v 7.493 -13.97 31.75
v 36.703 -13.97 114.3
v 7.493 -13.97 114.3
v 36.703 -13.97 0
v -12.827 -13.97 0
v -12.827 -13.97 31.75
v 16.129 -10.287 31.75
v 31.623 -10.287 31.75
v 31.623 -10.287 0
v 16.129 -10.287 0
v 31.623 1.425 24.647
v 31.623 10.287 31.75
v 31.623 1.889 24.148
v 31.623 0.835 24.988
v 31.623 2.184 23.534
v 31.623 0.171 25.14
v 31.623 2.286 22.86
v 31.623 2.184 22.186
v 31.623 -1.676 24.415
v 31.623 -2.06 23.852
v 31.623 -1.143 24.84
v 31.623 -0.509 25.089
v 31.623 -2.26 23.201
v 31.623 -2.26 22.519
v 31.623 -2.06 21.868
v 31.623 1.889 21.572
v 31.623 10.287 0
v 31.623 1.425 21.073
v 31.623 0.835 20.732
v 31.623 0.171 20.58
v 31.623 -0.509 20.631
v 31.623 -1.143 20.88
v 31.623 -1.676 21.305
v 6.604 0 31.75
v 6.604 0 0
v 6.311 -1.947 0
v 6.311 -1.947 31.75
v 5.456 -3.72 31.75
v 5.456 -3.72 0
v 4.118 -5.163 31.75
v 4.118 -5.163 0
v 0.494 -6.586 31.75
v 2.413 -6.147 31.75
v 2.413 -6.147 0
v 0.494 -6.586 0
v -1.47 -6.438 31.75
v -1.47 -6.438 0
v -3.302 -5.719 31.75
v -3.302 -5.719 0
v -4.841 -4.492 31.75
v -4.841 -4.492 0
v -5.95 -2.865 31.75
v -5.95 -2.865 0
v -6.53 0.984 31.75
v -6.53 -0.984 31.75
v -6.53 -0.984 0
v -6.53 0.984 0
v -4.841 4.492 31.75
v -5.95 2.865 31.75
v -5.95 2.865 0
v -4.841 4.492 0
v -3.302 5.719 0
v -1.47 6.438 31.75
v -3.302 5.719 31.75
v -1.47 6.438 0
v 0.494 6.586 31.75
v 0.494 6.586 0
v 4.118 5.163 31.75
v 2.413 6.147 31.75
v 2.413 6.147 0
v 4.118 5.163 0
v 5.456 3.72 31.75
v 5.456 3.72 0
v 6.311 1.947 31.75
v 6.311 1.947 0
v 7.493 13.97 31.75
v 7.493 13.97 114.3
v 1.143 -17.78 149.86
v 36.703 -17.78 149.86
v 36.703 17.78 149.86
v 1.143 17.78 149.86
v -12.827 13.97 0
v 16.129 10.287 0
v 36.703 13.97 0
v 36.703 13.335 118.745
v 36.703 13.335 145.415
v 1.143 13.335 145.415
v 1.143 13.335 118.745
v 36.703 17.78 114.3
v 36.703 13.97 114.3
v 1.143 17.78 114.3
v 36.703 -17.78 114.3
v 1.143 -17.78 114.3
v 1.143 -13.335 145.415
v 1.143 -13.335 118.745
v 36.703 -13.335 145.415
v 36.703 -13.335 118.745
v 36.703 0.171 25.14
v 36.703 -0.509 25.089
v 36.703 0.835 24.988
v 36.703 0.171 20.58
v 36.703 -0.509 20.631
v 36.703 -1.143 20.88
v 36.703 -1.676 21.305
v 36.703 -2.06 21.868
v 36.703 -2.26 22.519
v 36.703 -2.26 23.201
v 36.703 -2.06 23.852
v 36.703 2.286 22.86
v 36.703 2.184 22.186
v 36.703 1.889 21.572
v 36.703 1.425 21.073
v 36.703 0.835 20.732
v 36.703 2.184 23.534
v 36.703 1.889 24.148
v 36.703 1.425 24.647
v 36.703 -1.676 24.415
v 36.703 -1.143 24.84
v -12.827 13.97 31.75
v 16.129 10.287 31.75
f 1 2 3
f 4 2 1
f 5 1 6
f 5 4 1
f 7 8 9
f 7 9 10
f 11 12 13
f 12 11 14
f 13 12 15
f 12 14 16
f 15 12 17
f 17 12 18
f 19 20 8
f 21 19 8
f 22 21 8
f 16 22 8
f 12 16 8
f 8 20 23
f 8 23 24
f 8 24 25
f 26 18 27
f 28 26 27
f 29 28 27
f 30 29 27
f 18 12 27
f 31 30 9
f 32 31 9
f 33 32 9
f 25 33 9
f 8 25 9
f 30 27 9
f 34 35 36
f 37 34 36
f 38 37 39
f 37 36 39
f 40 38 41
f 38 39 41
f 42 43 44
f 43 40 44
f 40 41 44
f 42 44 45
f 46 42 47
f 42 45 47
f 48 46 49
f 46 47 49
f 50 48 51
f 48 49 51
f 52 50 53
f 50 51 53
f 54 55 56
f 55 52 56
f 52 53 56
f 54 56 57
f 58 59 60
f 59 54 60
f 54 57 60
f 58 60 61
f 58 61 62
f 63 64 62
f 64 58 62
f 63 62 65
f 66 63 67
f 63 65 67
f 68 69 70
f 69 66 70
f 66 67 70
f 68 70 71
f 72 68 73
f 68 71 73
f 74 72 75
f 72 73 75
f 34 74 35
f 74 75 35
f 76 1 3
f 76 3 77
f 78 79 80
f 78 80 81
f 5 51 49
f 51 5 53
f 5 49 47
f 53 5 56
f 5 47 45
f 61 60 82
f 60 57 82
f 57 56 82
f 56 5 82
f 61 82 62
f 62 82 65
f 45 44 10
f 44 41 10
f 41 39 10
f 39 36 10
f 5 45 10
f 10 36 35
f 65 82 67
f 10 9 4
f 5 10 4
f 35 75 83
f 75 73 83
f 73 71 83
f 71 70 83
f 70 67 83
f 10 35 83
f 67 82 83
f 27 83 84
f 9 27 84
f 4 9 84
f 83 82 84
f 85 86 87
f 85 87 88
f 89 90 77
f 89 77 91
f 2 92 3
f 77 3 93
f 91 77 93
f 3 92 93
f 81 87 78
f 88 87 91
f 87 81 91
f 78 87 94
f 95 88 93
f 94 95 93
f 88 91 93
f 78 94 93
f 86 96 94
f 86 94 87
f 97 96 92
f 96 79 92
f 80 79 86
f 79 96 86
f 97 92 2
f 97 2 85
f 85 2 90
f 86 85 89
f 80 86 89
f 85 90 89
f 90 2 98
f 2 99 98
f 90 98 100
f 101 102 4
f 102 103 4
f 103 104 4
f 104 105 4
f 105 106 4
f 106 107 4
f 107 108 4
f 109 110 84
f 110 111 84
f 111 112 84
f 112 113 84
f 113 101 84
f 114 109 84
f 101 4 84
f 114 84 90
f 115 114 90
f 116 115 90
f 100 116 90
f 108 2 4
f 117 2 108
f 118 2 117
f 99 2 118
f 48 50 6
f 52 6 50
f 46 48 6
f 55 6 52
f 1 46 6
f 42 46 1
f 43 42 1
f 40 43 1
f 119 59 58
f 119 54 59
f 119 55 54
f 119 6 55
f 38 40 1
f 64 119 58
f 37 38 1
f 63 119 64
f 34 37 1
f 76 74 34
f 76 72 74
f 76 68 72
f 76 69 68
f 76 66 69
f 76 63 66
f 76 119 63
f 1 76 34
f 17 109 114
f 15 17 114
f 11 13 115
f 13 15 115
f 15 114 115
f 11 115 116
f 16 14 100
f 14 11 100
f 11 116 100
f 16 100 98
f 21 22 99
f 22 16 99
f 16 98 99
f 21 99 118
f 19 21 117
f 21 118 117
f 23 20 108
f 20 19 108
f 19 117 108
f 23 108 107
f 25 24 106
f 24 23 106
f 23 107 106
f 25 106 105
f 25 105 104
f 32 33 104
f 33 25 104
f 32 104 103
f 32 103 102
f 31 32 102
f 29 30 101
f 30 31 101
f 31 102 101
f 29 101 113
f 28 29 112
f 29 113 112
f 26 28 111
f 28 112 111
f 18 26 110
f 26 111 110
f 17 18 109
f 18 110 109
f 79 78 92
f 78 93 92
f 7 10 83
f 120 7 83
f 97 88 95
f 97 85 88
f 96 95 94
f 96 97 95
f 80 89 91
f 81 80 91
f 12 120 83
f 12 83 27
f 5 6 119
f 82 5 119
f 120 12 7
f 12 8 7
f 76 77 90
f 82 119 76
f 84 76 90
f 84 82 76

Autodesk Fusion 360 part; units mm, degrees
sketch "Sketch1" plane through (0, 0, 0) normal (0, 0, 1) x (1, 0, 0)
  circle A0 centre (0, 0) radius 6.604
  line L0 (-12.827, 13.97) -> (36.703, 13.97)
  line L1 (36.703, 13.97) -> (36.703, -13.97)
  line L2 (36.703, -13.97) -> (-12.827, -13.97)
  line L3 (-12.827, -13.97) -> (-12.827, 13.97)
  line L4 (16.129, 10.287) -> (31.623, 10.287)
  line L5 (31.623, 10.287) -> (31.623, -10.287)
  line L6 (31.623, -10.287) -> (16.129, -10.287)
  line L7 (16.129, -10.287) -> (16.129, 10.287)
  line L8 (16.129, 0) -> (31.623, 0)
  point P0 (16.129, 0)
  point P1 (31.623, 0)
  point P2 (-12.827, 0)
  point P3 (36.703, 0)
  point P4 (23.876, 0)
  dimension "d1" = 13.208
  dimension "d2" = 15.494
  dimension "d3" = 20.574
  dimension "d4" = 23.876
  dimension "d5" = 5.08
  dimension "d6" = 49.53
  dimension "d7" = 27.94
extrude "Extrude1" add sketch "Sketch1" along normal blind 31.75
sketch "Sketch2" plane through (36.703, 0, 0) normal (1, 0, 0) x (0, 1, 0)
  line L0 (-13.97, 0) -> (13.97, 0)
  line L1 (13.97, 0) -> (13.97, 31.75)
  line L2 (13.97, 31.75) -> (-13.97, 31.75)
  line L3 (-13.97, 31.75) -> (-13.97, 0)
  line L4 (0, 0) -> (0, 40.147)
  circle A0 centre (0, 22.86) radius 2.286
  point P0 (0, 22.86)
  dimension "d10" = 8.89
  dimension "d11" = 4.572
extrude "Extrude2" cut sketch "Sketch2" against normal blind 7.62 contours L4 A0 | L4 A0
sketch "Sketch3" plane through (0, 0, 31.75) normal (0, 0, 1) x (-1, 0, 0)
  line L0 (-31.623, 10.287) -> (-16.129, 10.287)
  line L1 (-16.129, 10.287) -> (-16.129, -10.287)
  line L2 (-16.129, -10.287) -> (-31.623, -10.287)
  line L3 (-31.623, -10.287) -> (-31.623, 10.287)
  circle A0 centre (0, 0) radius 6.604
  line L4 (12.827, 13.97) -> (-36.703, 13.97)
  line L5 (-36.703, 13.97) -> (-36.703, -13.97)
  line L6 (-36.703, -13.97) -> (12.827, -13.97)
  line L7 (12.827, -13.97) -> (12.827, 13.97)
  line L8 (-7.493, -13.97) -> (-36.703, -13.97)
  line L9 (-36.703, -13.97) -> (-36.703, 13.97)
  line L10 (-36.703, 13.97) -> (-7.493, 13.97)
  line L11 (-7.493, 13.97) -> (-7.493, -13.97)
  dimension "d14" = 29.21
extrude "Extrude3" add sketch "Sketch3" along normal blind 82.55 contours L0 L1 L2 L3 | L4 L5 L6 L8 L9 L10 L11
sketch "Sketch4" plane through (0, 0, 114.3) normal (0, 0, 1) x (-1, 0, 0)
  line L0 (-7.493, 13.97) -> (-36.703, 13.97)
  line L1 (-36.703, 13.97) -> (-36.703, -13.97)
  line L2 (-36.703, -13.97) -> (-7.493, -13.97)
  line L3 (-7.493, -13.97) -> (-7.493, 13.97)
  line L4 (-36.703, -17.78) -> (-1.143, -17.78)
  line L5 (-1.143, -17.78) -> (-1.143, 17.78)
  line L6 (-1.143, 17.78) -> (-36.703, 17.78)
  line L7 (-36.703, 17.78) -> (-36.703, -17.78)
  line L8 (-36.703, -17.78) -> (-1.143, 17.78) construction
  line L9 (-1.143, -17.78) -> (-36.703, 17.78) construction
  line L10 (-36.703, -13.97) -> (-36.703, 13.97)
  point P0 (-18.923, 0)
  dimension "d17" = 35.56
  dimension "d18" = 35.56
extrude "Extrude4" add sketch "Sketch4" along normal blind 35.56
sketch "Sketch5" plane through (36.703, 0, 0) normal (1, 0, 0) x (0, 1, 0)
  circle A0 centre (0, 22.86) radius 2.286
  line L0 (-13.97, 0) -> (13.97, 0)
  line L1 (13.97, 0) -> (13.97, 114.3)
  line L2 (13.97, 114.3) -> (17.78, 114.3)
  line L3 (17.78, 114.3) -> (17.78, 149.86)
  line L4 (17.78, 149.86) -> (-17.78, 149.86)
  line L5 (-17.78, 149.86) -> (-17.78, 114.3)
  line L6 (-17.78, 114.3) -> (-13.97, 114.3)
  line L7 (-13.97, 114.3) -> (-13.97, 0)
  line L8 (-13.335, 145.415) -> (13.335, 145.415)
  line L9 (13.335, 145.415) -> (13.335, 118.745)
  line L10 (13.335, 118.745) -> (-13.335, 118.745)
  line L11 (-13.335, 118.745) -> (-13.335, 145.415)
  dimension "d21" = 4.445
  dimension "d22" = 4.445
  dimension "d23" = 4.445
  dimension "d24" = 4.445
extrude "Extrude5" cut sketch "Sketch5" against normal blind 45.72 contours L8 L9 L10 L11
